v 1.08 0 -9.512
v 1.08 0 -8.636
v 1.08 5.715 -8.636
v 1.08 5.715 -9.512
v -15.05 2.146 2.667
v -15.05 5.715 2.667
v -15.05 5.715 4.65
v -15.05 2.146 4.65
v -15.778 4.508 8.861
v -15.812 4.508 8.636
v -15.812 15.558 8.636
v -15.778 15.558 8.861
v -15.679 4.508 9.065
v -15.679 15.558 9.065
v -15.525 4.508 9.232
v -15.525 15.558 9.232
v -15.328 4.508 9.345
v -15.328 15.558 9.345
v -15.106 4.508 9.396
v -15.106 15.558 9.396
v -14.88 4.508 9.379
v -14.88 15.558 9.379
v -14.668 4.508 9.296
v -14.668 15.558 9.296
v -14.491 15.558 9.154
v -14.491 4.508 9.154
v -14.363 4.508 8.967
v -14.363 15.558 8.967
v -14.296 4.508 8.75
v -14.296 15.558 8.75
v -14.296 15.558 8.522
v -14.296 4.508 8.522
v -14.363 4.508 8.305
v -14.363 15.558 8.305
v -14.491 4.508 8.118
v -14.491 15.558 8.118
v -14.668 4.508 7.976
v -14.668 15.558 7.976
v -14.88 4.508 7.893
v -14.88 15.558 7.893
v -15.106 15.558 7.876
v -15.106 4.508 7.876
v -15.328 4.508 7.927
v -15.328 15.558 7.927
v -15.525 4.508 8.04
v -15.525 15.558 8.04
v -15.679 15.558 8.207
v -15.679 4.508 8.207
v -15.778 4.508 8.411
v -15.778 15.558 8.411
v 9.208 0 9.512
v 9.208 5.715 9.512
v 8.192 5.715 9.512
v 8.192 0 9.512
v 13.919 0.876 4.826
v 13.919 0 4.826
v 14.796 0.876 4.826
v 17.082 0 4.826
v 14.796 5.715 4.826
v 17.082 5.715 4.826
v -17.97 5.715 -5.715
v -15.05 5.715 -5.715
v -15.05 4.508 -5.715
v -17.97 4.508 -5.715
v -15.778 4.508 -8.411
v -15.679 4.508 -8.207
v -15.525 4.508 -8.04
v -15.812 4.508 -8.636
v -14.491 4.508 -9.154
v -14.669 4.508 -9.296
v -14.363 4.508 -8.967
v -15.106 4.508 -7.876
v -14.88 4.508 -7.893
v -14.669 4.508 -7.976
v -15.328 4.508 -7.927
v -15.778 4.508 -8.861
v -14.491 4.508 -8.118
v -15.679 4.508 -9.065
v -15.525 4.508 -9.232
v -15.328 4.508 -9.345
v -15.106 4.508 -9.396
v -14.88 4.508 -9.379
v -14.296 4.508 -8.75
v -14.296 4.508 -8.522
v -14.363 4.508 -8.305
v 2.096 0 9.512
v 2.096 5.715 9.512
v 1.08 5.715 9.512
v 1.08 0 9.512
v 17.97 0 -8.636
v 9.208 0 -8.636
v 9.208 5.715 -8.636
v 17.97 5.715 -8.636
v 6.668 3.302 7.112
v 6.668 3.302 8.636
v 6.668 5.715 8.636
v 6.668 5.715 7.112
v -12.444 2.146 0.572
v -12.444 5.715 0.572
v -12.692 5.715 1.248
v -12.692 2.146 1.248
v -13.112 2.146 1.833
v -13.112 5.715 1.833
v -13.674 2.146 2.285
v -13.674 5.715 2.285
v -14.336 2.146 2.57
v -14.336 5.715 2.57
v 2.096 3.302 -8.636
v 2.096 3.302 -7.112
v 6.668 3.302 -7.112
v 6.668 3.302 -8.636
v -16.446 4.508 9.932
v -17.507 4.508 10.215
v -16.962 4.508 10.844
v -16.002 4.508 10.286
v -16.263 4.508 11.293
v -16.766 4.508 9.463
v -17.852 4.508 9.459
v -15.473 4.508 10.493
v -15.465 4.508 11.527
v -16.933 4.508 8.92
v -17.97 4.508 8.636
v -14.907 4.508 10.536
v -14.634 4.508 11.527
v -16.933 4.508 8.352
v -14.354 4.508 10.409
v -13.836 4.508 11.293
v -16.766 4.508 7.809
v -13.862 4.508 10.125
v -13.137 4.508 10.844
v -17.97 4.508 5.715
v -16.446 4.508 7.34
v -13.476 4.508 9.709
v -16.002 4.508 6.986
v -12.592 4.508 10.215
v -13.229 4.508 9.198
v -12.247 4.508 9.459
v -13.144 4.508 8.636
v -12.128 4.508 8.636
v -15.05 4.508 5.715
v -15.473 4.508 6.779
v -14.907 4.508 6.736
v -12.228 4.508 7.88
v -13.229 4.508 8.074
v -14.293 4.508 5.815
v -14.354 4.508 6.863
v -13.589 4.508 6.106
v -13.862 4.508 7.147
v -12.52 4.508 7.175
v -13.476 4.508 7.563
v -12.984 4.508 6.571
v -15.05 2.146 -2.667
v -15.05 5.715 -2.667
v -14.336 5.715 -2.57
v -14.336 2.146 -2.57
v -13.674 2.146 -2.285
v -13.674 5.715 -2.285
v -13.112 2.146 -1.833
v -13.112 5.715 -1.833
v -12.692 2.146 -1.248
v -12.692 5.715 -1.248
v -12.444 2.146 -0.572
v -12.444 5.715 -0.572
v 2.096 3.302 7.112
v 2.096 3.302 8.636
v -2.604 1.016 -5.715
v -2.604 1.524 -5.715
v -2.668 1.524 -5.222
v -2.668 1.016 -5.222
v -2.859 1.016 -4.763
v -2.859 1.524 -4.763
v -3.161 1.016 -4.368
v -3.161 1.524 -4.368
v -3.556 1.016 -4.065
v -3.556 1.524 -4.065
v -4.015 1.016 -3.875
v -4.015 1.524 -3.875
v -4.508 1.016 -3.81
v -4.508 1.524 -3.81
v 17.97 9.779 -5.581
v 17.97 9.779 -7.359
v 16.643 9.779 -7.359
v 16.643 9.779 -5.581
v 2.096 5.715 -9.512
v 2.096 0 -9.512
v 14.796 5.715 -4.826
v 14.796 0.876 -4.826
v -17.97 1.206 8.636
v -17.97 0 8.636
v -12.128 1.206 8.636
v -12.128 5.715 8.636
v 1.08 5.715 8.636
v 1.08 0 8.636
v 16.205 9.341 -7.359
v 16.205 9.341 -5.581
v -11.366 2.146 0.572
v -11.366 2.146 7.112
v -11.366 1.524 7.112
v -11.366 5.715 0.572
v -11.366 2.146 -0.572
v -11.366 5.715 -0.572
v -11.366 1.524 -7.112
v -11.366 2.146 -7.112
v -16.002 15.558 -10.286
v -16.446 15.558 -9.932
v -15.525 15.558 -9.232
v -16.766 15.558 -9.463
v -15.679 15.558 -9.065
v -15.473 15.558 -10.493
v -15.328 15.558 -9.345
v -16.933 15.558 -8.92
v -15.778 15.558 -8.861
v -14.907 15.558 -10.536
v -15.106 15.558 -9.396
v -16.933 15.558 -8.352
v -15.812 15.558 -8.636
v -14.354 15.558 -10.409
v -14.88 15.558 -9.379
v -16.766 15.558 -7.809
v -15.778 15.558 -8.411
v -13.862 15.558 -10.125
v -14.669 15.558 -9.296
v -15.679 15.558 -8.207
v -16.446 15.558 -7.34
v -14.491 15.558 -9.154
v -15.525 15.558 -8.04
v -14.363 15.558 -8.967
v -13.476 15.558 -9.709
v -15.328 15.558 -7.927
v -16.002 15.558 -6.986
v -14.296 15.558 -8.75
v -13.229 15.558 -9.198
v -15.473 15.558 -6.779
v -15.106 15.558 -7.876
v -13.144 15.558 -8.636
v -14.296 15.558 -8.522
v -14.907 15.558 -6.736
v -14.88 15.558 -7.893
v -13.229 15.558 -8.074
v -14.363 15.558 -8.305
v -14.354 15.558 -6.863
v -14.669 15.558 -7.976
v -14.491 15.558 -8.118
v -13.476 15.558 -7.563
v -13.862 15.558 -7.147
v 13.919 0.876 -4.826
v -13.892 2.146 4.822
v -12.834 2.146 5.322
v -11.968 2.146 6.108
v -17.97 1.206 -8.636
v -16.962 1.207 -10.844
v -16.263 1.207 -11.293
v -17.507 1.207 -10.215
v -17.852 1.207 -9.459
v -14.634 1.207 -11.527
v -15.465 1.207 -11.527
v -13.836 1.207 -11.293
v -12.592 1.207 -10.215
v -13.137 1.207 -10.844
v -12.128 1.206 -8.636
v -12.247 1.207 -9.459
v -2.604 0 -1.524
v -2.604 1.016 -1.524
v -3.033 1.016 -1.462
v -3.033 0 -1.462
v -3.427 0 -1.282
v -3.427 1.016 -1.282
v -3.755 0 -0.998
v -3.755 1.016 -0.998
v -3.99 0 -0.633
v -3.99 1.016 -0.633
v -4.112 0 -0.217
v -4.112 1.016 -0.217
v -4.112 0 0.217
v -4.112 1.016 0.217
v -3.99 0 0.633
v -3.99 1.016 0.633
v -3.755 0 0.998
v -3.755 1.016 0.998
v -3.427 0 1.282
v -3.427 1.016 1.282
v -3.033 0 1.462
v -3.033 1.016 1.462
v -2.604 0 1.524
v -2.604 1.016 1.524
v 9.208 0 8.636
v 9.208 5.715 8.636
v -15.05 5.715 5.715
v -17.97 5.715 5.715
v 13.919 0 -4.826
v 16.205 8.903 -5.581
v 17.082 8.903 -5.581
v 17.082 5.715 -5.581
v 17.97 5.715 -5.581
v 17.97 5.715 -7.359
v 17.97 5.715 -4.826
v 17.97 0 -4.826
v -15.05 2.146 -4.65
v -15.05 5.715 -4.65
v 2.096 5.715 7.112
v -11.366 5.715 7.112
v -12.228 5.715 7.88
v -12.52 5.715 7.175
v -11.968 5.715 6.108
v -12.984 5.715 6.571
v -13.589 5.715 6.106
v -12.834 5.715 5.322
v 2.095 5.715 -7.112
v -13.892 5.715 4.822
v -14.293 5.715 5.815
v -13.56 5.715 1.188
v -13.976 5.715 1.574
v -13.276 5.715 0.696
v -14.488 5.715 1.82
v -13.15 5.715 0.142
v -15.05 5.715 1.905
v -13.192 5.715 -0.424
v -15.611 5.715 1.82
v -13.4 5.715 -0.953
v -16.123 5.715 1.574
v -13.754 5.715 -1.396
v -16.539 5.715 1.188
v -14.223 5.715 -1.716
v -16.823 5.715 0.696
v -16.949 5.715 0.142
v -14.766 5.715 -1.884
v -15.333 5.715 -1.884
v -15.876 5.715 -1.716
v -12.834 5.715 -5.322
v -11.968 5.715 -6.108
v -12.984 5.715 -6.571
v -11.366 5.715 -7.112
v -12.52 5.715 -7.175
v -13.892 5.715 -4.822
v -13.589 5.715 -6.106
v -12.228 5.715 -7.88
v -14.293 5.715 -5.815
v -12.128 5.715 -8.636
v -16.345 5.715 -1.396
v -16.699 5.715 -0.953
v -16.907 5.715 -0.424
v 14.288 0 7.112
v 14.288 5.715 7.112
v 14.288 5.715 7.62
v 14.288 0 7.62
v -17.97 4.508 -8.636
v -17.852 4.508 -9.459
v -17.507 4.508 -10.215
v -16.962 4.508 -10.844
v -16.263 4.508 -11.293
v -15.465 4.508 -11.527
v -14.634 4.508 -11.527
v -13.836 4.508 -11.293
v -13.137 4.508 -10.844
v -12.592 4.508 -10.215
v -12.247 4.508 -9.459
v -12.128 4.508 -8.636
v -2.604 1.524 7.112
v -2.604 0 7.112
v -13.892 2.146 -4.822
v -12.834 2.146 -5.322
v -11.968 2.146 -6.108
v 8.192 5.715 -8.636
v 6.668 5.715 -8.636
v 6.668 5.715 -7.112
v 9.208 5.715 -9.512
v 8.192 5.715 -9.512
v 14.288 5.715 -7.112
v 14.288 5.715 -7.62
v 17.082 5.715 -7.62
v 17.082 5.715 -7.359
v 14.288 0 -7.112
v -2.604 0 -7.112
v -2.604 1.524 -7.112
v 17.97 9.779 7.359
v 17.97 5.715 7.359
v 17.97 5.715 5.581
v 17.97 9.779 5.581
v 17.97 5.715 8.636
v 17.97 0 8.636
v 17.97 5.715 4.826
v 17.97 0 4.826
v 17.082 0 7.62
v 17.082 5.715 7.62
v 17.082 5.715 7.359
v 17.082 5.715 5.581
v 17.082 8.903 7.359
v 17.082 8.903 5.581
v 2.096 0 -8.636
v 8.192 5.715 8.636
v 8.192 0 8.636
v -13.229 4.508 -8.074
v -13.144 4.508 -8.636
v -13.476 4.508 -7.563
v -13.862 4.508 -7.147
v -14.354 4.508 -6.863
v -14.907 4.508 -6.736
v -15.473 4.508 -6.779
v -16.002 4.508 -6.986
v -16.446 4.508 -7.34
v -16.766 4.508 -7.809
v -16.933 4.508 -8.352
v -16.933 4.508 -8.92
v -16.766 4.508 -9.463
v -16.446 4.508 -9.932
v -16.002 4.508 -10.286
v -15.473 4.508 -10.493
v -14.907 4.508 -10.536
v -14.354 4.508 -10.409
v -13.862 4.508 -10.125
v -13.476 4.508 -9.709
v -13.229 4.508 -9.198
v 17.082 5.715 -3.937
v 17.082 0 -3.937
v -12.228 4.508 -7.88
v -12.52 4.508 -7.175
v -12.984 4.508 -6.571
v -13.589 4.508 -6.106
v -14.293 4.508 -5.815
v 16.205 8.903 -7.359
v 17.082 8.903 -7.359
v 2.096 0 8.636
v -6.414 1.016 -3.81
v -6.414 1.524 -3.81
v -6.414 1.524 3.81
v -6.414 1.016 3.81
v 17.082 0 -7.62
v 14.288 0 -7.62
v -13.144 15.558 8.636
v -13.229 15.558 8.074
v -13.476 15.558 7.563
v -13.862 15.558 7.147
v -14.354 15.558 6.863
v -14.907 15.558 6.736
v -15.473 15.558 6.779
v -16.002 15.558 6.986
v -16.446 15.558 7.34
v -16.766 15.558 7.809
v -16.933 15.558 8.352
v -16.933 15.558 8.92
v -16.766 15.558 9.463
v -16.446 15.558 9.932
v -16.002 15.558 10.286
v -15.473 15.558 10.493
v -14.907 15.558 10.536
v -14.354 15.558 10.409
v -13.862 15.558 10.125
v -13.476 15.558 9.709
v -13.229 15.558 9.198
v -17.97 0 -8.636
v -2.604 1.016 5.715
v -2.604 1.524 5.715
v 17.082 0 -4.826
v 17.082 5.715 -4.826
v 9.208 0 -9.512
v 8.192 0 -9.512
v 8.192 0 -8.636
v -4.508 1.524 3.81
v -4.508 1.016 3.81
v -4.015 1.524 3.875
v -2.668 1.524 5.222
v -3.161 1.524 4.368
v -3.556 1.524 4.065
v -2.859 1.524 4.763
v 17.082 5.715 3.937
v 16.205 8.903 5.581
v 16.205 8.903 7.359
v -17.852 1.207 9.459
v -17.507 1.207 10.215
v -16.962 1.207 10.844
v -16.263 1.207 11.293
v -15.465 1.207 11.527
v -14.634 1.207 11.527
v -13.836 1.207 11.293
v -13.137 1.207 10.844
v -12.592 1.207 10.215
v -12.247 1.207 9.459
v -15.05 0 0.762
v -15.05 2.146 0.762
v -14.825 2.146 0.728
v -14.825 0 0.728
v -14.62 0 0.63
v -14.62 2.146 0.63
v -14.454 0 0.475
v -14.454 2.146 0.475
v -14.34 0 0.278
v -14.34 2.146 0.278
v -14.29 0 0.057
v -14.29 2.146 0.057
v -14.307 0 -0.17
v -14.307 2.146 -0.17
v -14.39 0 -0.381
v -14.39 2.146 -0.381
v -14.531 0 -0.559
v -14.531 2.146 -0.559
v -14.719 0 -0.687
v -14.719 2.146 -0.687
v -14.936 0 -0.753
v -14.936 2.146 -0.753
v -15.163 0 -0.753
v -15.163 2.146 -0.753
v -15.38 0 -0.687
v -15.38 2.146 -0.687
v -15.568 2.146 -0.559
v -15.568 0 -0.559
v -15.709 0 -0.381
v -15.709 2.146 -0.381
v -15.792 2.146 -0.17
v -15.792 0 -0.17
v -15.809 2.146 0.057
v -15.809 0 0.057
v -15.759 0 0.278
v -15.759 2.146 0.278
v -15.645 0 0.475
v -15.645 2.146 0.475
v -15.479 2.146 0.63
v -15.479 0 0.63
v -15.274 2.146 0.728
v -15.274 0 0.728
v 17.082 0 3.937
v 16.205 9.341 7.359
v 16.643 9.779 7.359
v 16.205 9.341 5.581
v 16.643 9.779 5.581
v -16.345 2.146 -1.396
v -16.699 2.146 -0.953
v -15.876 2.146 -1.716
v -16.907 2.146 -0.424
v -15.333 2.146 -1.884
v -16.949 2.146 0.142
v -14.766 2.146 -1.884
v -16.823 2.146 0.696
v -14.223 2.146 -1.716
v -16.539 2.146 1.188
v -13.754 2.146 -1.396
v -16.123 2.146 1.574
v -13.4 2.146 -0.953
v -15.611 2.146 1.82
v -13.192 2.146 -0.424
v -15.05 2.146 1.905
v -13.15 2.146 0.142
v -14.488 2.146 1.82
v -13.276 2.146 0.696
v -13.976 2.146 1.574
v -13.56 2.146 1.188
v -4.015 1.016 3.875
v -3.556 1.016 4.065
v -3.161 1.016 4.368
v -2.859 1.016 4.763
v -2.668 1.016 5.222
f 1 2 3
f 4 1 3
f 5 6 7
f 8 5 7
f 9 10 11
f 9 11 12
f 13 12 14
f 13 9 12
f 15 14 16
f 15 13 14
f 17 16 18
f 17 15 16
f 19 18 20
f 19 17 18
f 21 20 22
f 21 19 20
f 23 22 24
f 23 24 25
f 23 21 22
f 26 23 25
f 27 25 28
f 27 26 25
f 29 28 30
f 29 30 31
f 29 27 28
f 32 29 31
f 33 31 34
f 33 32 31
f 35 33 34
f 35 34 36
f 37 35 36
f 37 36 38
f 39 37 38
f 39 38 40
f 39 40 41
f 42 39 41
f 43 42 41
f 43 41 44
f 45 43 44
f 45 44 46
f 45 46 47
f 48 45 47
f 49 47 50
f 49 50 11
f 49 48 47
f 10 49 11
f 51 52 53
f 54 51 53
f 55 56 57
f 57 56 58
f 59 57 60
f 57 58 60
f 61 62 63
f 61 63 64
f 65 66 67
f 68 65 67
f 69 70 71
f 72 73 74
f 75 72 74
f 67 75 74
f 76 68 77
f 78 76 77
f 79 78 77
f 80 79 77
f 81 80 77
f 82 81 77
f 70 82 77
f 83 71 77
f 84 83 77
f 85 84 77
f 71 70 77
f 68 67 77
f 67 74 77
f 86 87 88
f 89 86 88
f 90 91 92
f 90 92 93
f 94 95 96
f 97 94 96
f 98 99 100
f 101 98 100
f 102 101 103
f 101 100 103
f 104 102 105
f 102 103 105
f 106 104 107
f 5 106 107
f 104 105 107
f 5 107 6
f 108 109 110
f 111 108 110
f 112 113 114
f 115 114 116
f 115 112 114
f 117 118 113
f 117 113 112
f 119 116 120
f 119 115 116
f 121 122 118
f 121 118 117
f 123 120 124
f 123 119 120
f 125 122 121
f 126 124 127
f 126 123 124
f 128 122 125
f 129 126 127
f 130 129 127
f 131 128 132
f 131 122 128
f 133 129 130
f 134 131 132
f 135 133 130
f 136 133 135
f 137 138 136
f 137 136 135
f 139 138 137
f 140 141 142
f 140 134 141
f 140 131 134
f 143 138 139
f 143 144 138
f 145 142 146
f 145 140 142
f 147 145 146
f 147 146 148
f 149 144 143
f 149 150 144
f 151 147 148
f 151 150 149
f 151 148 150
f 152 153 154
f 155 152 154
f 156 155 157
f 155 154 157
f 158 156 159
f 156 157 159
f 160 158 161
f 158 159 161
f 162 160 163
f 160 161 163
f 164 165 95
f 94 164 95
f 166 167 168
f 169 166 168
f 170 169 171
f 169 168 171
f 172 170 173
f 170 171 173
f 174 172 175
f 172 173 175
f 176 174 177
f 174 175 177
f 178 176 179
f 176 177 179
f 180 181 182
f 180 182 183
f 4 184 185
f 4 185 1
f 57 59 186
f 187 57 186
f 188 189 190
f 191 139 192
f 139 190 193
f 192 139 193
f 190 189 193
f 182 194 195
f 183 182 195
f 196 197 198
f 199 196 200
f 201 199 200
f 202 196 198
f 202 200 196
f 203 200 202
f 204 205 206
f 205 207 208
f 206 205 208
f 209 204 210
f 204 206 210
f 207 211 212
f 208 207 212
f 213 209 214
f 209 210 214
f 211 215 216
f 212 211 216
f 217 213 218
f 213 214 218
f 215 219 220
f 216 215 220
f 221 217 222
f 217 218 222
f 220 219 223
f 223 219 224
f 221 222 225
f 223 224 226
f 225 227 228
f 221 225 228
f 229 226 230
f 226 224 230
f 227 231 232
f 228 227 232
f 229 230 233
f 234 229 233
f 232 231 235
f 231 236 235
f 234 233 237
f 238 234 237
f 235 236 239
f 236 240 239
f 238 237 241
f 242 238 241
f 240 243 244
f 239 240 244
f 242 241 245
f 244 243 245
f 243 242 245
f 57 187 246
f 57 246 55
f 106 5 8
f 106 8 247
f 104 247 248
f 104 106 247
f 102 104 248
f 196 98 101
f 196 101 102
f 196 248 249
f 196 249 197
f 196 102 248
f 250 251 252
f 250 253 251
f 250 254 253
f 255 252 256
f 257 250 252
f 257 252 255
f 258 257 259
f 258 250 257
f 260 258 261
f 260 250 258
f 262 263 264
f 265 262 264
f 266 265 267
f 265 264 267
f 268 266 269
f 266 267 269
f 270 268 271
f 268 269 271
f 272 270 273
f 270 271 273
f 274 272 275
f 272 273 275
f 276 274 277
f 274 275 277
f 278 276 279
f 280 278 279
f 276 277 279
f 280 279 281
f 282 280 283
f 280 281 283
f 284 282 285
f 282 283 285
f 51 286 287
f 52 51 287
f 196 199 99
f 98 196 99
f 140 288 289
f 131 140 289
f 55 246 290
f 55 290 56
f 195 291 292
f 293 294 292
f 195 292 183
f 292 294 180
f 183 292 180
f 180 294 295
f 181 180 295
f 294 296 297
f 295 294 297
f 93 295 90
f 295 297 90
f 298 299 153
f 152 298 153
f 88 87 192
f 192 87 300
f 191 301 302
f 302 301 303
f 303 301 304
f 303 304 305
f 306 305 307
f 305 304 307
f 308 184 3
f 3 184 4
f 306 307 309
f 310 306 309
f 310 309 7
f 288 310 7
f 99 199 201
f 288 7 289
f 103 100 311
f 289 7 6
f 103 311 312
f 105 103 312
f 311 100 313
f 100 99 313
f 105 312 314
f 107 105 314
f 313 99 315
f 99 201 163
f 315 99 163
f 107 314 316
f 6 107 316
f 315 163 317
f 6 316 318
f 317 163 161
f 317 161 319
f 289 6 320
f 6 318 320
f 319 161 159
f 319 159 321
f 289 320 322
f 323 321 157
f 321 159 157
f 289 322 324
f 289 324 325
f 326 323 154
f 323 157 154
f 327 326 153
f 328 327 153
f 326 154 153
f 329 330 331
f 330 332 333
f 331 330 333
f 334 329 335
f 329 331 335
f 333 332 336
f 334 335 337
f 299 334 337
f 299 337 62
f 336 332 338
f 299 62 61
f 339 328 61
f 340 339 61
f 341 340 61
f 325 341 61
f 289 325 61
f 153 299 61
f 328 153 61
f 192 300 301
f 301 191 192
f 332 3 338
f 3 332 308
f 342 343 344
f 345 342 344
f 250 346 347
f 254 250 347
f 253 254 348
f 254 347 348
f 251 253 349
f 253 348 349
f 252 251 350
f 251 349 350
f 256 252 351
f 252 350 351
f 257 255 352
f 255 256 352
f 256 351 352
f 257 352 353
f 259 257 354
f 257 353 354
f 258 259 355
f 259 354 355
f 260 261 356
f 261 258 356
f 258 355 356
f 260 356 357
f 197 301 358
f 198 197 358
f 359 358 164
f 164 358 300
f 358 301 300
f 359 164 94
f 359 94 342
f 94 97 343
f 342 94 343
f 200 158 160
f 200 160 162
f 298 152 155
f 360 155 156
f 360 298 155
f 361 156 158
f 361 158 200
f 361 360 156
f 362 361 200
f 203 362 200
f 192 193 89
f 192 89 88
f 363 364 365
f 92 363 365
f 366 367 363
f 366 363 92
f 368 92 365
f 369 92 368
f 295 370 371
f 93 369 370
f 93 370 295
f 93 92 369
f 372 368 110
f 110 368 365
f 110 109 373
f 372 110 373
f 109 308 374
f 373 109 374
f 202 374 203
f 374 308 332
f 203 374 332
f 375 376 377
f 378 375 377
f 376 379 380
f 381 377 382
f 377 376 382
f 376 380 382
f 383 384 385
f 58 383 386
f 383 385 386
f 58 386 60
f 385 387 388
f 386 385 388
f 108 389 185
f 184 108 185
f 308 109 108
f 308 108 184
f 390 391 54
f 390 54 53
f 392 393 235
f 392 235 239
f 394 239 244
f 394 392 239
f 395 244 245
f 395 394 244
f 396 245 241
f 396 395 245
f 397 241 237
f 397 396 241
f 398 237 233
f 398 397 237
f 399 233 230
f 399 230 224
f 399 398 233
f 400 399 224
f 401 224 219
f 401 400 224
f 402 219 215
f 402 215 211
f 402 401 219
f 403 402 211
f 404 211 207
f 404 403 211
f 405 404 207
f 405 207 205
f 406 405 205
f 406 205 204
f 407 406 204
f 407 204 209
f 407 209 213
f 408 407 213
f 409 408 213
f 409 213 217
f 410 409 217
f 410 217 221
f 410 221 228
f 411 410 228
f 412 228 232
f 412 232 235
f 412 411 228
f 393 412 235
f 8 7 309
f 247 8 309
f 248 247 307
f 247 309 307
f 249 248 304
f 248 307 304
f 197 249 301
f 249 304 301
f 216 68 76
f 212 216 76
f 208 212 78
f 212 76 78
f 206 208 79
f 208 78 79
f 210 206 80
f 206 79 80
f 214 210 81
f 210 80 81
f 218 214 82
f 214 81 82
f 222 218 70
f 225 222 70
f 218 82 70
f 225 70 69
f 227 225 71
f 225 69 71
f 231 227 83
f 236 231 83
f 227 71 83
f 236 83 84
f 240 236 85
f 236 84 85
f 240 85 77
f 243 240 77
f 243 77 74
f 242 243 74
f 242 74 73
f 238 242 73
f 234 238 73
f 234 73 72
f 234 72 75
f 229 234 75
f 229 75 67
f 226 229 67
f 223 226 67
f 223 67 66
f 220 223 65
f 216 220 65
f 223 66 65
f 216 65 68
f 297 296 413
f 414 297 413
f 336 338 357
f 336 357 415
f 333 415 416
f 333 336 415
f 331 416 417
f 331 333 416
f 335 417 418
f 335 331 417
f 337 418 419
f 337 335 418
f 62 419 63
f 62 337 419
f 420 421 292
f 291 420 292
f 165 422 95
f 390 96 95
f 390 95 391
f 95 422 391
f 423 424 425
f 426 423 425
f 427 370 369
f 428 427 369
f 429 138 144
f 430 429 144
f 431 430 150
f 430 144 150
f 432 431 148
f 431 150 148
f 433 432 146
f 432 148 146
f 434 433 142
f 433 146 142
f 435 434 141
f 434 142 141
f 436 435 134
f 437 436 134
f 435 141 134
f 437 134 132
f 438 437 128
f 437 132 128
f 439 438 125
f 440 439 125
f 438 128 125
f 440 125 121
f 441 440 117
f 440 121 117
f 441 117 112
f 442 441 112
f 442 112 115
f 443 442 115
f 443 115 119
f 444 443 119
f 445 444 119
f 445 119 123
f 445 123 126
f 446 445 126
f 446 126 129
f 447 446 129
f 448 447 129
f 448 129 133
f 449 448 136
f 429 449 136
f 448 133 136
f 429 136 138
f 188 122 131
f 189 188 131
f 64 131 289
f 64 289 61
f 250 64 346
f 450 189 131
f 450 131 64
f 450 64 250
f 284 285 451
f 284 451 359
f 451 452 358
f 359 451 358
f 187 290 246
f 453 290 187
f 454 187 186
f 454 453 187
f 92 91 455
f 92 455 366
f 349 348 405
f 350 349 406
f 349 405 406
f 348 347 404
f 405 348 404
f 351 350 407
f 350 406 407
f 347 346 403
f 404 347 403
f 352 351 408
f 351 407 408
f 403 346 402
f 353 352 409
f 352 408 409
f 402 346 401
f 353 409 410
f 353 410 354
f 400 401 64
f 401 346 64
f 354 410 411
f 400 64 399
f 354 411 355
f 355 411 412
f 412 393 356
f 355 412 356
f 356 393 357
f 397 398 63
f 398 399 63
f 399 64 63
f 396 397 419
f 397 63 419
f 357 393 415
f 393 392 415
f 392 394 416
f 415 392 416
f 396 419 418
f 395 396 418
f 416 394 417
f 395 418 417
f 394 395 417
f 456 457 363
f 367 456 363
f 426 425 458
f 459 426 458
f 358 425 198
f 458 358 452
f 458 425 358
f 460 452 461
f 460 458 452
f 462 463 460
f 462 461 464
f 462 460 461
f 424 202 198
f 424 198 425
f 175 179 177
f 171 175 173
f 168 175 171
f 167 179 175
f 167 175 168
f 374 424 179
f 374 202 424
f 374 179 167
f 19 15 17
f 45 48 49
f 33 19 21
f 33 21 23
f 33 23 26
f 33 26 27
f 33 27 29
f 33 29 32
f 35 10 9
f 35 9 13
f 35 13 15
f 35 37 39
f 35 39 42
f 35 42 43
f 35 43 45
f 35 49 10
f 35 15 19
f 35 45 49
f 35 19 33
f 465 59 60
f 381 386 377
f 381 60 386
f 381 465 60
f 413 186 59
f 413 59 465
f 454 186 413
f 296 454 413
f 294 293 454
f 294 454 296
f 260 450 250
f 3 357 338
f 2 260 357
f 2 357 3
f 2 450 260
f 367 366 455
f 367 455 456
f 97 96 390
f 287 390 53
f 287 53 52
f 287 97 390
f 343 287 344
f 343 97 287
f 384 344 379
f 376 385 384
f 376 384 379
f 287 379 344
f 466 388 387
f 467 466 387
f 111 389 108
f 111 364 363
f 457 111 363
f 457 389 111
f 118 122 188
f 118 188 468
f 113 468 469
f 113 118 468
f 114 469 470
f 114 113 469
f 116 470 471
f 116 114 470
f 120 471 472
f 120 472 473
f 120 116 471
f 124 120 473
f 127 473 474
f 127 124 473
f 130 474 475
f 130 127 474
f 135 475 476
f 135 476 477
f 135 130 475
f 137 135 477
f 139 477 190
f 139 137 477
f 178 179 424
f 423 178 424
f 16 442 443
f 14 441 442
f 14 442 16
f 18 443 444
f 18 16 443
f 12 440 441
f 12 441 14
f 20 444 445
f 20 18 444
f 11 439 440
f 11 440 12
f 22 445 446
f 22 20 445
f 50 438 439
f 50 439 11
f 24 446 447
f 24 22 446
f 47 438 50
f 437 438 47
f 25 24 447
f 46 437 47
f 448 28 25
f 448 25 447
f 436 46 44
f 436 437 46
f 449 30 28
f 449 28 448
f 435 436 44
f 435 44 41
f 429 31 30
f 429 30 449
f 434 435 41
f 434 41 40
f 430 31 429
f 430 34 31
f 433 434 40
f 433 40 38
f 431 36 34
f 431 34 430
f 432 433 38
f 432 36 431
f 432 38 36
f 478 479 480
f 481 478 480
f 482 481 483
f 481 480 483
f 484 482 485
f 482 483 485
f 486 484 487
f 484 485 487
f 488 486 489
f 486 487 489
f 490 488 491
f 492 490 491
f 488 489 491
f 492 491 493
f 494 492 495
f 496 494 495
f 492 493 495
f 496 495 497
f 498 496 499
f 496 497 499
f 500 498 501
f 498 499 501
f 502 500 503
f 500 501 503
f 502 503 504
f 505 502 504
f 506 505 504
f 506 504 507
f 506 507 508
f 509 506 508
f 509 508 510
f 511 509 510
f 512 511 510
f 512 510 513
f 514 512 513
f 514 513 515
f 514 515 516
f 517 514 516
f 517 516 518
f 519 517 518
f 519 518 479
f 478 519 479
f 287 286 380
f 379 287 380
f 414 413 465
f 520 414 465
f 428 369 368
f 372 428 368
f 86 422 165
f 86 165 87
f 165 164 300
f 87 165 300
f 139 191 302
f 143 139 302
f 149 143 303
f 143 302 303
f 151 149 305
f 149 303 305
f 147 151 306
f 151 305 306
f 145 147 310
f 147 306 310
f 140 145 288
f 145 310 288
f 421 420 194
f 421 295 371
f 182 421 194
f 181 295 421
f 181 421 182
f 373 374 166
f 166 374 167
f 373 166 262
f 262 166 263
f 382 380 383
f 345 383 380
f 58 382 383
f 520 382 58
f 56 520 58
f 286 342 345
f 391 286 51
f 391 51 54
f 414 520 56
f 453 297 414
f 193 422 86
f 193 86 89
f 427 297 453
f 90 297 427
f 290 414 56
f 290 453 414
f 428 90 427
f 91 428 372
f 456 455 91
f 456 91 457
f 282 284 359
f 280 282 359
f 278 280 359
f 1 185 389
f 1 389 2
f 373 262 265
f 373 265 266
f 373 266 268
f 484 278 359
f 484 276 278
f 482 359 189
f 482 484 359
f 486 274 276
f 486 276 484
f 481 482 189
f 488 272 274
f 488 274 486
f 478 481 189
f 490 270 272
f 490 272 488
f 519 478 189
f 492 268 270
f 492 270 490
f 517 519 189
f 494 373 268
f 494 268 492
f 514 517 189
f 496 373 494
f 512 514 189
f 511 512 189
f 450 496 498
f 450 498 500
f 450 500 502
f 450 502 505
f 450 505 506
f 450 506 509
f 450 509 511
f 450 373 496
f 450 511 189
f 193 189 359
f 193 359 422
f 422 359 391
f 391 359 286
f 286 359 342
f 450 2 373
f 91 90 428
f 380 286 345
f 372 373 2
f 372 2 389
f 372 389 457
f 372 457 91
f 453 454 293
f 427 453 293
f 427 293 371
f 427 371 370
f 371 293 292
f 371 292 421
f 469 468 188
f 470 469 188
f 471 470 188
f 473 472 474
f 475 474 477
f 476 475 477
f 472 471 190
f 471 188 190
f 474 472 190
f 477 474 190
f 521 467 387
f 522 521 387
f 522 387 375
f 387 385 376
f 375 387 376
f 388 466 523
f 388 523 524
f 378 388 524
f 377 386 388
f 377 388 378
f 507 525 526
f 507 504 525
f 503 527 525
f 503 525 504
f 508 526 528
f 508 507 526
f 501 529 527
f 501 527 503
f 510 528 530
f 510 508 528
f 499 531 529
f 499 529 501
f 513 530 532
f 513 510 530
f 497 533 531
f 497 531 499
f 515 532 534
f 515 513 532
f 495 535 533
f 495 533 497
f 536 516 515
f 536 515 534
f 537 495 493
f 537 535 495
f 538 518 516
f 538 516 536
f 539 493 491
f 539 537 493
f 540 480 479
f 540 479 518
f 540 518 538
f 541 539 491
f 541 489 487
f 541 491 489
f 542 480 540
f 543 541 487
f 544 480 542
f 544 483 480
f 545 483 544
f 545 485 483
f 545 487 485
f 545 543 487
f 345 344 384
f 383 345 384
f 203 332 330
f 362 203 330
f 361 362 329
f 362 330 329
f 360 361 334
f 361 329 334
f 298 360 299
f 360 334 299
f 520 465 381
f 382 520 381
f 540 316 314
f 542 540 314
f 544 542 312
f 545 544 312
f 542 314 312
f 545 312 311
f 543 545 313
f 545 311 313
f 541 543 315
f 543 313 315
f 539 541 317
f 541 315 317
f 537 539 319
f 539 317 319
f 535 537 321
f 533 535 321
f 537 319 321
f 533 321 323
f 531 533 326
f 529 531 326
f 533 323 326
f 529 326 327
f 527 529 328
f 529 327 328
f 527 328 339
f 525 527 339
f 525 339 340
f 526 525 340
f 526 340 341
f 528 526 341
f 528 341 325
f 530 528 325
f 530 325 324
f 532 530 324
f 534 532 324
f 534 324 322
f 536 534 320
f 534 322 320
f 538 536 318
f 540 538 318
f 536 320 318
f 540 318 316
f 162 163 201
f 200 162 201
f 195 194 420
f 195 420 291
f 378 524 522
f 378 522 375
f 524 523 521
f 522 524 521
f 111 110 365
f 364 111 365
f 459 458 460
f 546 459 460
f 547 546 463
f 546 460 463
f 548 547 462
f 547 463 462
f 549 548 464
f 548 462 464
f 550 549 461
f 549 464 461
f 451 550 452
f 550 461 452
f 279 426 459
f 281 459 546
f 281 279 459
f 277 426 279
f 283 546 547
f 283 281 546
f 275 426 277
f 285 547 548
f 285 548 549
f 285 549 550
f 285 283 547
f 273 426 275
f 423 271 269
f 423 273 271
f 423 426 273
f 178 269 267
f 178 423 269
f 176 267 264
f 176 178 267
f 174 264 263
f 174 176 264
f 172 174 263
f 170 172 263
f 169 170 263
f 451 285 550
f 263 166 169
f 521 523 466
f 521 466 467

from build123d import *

# Parameters (mm, degrees)
SKETCH1_W           = 35.941
SKETCH1_H           = 17.272
BOSS_EXTRUDE1_DEPTH = 5.715
SKETCH2_W           = 4.572
SKETCH2_H           = 2.413
CUT_EXTRUDE1_DEPTH  = 26.571900188
CUT_EXTRUDE2_DEPTH  = 21.740795338
SKETCH4_W           = 8.763
SKETCH4_H           = 14.224
CUT_EXTRUDE3_DEPTH  = 2.54
SKETCH4_2_W         = 8.763
SKETCH4_2_H         = 14.224
CUT_EXTRUDE4_DEPTH  = 4.191
SKETCH6_W           = 9.652
SKETCH6_H           = 0.8763
BOSS_EXTRUDE2_DEPTH = 0.8763
SKETCH7_W           = 0.889
SKETCH7_H           = 1.778
BOSS_EXTRUDE3_DEPTH = 4.064
SKETCH9_W           = 1.778
SKETCH9_H           = 0.8763
BOSS_EXTRUDE5_DEPTH = 0.8763
CHAMFER1_SIZE       = 0.43815
SKETCH11_W          = 1.016
SKETCH11_H          = 5.715
BOSS_EXTRUDE6_DEPTH = 0.8763
CUT_EXTRUDE5_DEPTH  = 0.508
CUT_EXTRUDE6_DEPTH  = 23.140751806
SKETCH20_W          = 5.842
SKETCH20_H          = 3.302
BOSS_EXTRUDE8_DEPTH = 4.318
CUT_EXTRUDE12_DEPTH = 1.2065
CUT_EXTRUDE13_DEPTH = 23.771103542
SKETCH26_R          = 1.905
SKETCH26_R_2        = 0.762
BOSS_EXTRUDE9_DEPTH = 11.049
SKETCH27_R          = 1.905
CUT_EXTRUDE14_DEPTH = 3.5687
SKETCH29_R          = 0.762
CUT_EXTRUDE15_DEPTH = 26.226244364


with BuildPart() as part:
    # Sketch1 → Boss-Extrude1 (new body)
    with BuildSketch(Plane(origin=(0, 0, 0), x_dir=(1, 0, 0), z_dir=(0, 1, 0))):
        Rectangle(SKETCH1_W, SKETCH1_H)
    extrude(amount=BOSS_EXTRUDE1_DEPTH)

    # Sketch2 → Cut-Extrude1 (cut, through all)
    with BuildSketch(Plane.XY.offset(8.636)):
        with Locations((4.3815, 4.5085)):
            Rectangle(SKETCH2_W, SKETCH2_H)
    extrude(amount=-CUT_EXTRUDE1_DEPTH, mode=Mode.SUBTRACT)

    # Sketch3 → Cut-Extrude2 (cut, through all)
    with BuildSketch(Plane(origin=(0, 5.715, 0), x_dir=(1, 0, 0), z_dir=(0, 1, 0))):
        Polygon((17.0815, 3.937), (17.0815, -3.937), (17.9705, -4.826), (17.9705, 4.826), align=None)
        Polygon((17.0815, 4.826), (17.0815, 7.62), (14.2875, 7.62), (14.2875, 7.112), (-2.6035, 7.112), (-2.6035, -7.112), (14.2875, -7.112), (14.2875, -7.62), (17.0815, -7.62), (17.0815, -4.826), (14.7955, -4.826), (14.7955, 4.826), align=None)
    extrude(amount=-CUT_EXTRUDE2_DEPTH, mode=Mode.SUBTRACT)

    # Sketch4 → Cut-Extrude3 (cut)
    with BuildSketch(Plane(origin=(0, 5.715, 0), x_dir=(1, 0, 0), z_dir=(0, 1, 0))):
        with Locations((-6.985, 0)):
            Rectangle(SKETCH4_W, SKETCH4_H)
    extrude(amount=-CUT_EXTRUDE3_DEPTH, mode=Mode.SUBTRACT)

    # Sketch4<2> → Cut-Extrude4 (cut)
    with BuildSketch(Plane(origin=(0, 5.715, 0), x_dir=(1, 0, 0), z_dir=(0, 1, 0))):
        with Locations((-6.985, 0)):
            Rectangle(SKETCH4_2_W, SKETCH4_2_H)
    extrude(amount=-CUT_EXTRUDE4_DEPTH, mode=Mode.SUBTRACT)

    # Sketch6 → Boss-Extrude2 (add)
    with BuildSketch(Plane.ZY.offset(-14.7955)):
        with Locations((0, 0.43815)):
            Rectangle(SKETCH6_W, SKETCH6_H)
    extrude(amount=BOSS_EXTRUDE2_DEPTH)

    # Sketch7 → Boss-Extrude3 (add)
    with BuildSketch(Plane(origin=(0, 5.715, 0), x_dir=(1, 0, 0), z_dir=(0, 1, 0))):
        with Locations((17.526, 6.470028065)):
            Rectangle(SKETCH7_W, SKETCH7_H)
        with Locations((17.526, -6.470028065)):
            Rectangle(SKETCH7_W, SKETCH7_H)
    extrude(amount=BOSS_EXTRUDE3_DEPTH)

    # Sketch9 → Boss-Extrude5 (add)
    with BuildSketch(Plane.ZY.offset(-17.0815)):
        with Locations((-6.470028065, 9.34085)):
            Rectangle(SKETCH9_W, SKETCH9_H)
        with Locations((6.470028065, 9.34085)):
            Rectangle(SKETCH9_W, SKETCH9_H)
    extrude(amount=BOSS_EXTRUDE5_DEPTH)

    # Chamfer1
    chamfer1_edges = [part.edges().sort_by_distance(p)[0] for p in [
        (16.2052, 9.779, 6.470028065),
        (16.2052, 9.779, -6.470028065),
    ]]
    chamfer(chamfer1_edges, length=CHAMFER1_SIZE)

    # Sketch11 → Boss-Extrude6 (add)
    with BuildSketch(Plane(origin=(0, 0, -8.636), x_dir=(-1, 0, 0), z_dir=(0, 0, -1))):
        with Locations((-1.5875, 2.8575)):
            Rectangle(SKETCH11_W, SKETCH11_H)
        with Locations((-8.6995, 2.8575)):
            Rectangle(SKETCH11_W, SKETCH11_H)
    boss_extrude6 = extrude(amount=BOSS_EXTRUDE6_DEPTH)

    # Mirror1: Boss-Extrude6 across plane
    add(boss_extrude6.mirror(Plane.XY))

    # Sketch12 → Cut-Extrude5 (cut)
    with BuildSketch(Plane(origin=(0, 1.524, 0), x_dir=(1, 0, 0), z_dir=(0, 1, 0))):
        with BuildLine():
            Line((-2.6035, -5.715), (-2.6035, 5.715))
            ThreePointArc((-2.6035, 5.715), (-3.161461582, 4.367961582), (-4.5085, 3.81))
            Line((-4.5085, 3.81), (-6.4135, 3.81))
            Line((-6.4135, 3.81), (-6.4135, -3.81))
            Line((-6.4135, -3.81), (-4.5085, -3.81))
            ThreePointArc((-4.5085, -3.81), (-3.161461582, -4.367961582), (-2.6035, -5.715))
        make_face()
    extrude(amount=-CUT_EXTRUDE5_DEPTH, mode=Mode.SUBTRACT)

    # Sketch13 → Cut-Extrude6 (cut, through all)
    with BuildSketch(Plane(origin=(0, 1.016, 0), x_dir=(1, 0, 0), z_dir=(0, 1, 0))):
        with BuildLine():
            Line((-2.6035, -1.524), (-2.6035, 1.524))
            ThreePointArc((-2.6035, 1.524), (-4.1275, 0), (-2.6035, -1.524))
        make_face()
    extrude(amount=-CUT_EXTRUDE6_DEPTH, mode=Mode.SUBTRACT)

    # Sketch20 → Boss-Extrude8 (add)
    with BuildSketch(Plane.XY.offset(8.636)):
        with Locations((-15.0495, 2.8575)):
            Rectangle(SKETCH20_W, SKETCH20_H)
    boss_extrude8 = extrude(amount=BOSS_EXTRUDE8_DEPTH)

    # Mirror5: Boss-Extrude8 across plane
    add(boss_extrude8.mirror(Plane.XY))

    # Sketch23 → Cut-Extrude12 (cut)
    with BuildSketch(Plane(origin=(0, 5.715, 0), x_dir=(1, 0, 0), z_dir=(0, 1, 0))):
        with BuildLine():
            Line((-15.0495, -5.715), (-17.9705, -5.715))
            Line((-17.9705, -5.715), (-17.9705, -8.636))
            Line((-17.9705, -8.636), (-12.1285, -8.636))
            ThreePointArc((-12.1285, -8.636), (-12.984041092, -6.570541092), (-15.0495, -5.715))
        make_face()
    cut_extrude12 = extrude(amount=-CUT_EXTRUDE12_DEPTH, mode=Mode.SUBTRACT)

    # Mirror8: Cut-Extrude12 across plane
    add(cut_extrude12.mirror(Plane.XY), mode=Mode.SUBTRACT)

    # Sketch25 → Cut-Extrude13 (cut, through all)
    with BuildSketch(Plane(origin=(0, 4.5085, 0), x_dir=(1, 0, 0), z_dir=(0, 1, 0))):
        with BuildLine():
            Line((-12.1285, -8.636), (-12.1285, -12.954))
            Line((-12.1285, -12.954), (-17.9705, -12.954))
            Line((-17.9705, -12.954), (-17.9705, -8.636))
            ThreePointArc((-17.9705, -8.636), (-15.0495, -11.557), (-12.1285, -8.636))
        make_face()
    cut_extrude13 = extrude(amount=-CUT_EXTRUDE13_DEPTH, mode=Mode.SUBTRACT)

    # Mirror9: Cut-Extrude13 across plane
    add(cut_extrude13.mirror(Plane.XY), mode=Mode.SUBTRACT)

    # Sketch26 → Boss-Extrude9 (add)
    with BuildSketch(Plane(origin=(0, 4.5085, 0), x_dir=(1, 0, 0), z_dir=(0, 1, 0))):
        with Locations((-15.0495, -8.636)):
            Circle(SKETCH26_R)
        with Locations((-15.0495, -8.636)):
            Circle(SKETCH26_R_2, mode=Mode.SUBTRACT)
    boss_extrude9 = extrude(amount=BOSS_EXTRUDE9_DEPTH)

    # Mirror10: Boss-Extrude9 across plane
    add(boss_extrude9.mirror(Plane.XY))

    # Sketch27 → Cut-Extrude14 (cut)
    with BuildSketch(Plane(origin=(0, 5.715, 0), x_dir=(1, 0, 0), z_dir=(0, 1, 0))):
        with BuildLine():
            Line((-11.3665, -7.112), (-11.3665, -0.5715))
            Line((-11.3665, -0.5715), (-12.44445168, -0.5715))
            ThreePointArc((-12.44445168, -0.5715), (-13.377869284, -2.078109658), (-15.0495, -2.667))
            Line((-15.0495, -2.667), (-15.0495, -4.650141874))
            ThreePointArc((-15.0495, -4.650141874), (-12.834481127, -5.322277563), (-11.3665, -7.112))
        make_face()
        with BuildLine():
            Line((-12.44445168, 0.5715), (-11.3665, 0.5715))
            Line((-11.3665, 0.5715), (-11.3665, 7.112))
            ThreePointArc((-11.3665, 7.112), (-12.834481127, 5.322277563), (-15.0495, 4.650141874))
            Line((-15.0495, 4.650141874), (-15.0495, 2.667))
            ThreePointArc((-15.0495, 2.667), (-13.377869284, 2.078109658), (-12.44445168, 0.5715))
        make_face()
        with Locations((-15.0495, 0)):
            Circle(SKETCH27_R)
    extrude(amount=-CUT_EXTRUDE14_DEPTH, mode=Mode.SUBTRACT)

    # Sketch29 → Cut-Extrude15 (cut, through all)
    with BuildSketch(Plane(origin=(0, 2.1463, 0), x_dir=(1, 0, 0), z_dir=(0, 1, 0))):
        with Locations((-15.0495, 0)):
            Circle(SKETCH29_R)
    extrude(amount=-CUT_EXTRUDE15_DEPTH, mode=Mode.SUBTRACT)


solid = part.part
